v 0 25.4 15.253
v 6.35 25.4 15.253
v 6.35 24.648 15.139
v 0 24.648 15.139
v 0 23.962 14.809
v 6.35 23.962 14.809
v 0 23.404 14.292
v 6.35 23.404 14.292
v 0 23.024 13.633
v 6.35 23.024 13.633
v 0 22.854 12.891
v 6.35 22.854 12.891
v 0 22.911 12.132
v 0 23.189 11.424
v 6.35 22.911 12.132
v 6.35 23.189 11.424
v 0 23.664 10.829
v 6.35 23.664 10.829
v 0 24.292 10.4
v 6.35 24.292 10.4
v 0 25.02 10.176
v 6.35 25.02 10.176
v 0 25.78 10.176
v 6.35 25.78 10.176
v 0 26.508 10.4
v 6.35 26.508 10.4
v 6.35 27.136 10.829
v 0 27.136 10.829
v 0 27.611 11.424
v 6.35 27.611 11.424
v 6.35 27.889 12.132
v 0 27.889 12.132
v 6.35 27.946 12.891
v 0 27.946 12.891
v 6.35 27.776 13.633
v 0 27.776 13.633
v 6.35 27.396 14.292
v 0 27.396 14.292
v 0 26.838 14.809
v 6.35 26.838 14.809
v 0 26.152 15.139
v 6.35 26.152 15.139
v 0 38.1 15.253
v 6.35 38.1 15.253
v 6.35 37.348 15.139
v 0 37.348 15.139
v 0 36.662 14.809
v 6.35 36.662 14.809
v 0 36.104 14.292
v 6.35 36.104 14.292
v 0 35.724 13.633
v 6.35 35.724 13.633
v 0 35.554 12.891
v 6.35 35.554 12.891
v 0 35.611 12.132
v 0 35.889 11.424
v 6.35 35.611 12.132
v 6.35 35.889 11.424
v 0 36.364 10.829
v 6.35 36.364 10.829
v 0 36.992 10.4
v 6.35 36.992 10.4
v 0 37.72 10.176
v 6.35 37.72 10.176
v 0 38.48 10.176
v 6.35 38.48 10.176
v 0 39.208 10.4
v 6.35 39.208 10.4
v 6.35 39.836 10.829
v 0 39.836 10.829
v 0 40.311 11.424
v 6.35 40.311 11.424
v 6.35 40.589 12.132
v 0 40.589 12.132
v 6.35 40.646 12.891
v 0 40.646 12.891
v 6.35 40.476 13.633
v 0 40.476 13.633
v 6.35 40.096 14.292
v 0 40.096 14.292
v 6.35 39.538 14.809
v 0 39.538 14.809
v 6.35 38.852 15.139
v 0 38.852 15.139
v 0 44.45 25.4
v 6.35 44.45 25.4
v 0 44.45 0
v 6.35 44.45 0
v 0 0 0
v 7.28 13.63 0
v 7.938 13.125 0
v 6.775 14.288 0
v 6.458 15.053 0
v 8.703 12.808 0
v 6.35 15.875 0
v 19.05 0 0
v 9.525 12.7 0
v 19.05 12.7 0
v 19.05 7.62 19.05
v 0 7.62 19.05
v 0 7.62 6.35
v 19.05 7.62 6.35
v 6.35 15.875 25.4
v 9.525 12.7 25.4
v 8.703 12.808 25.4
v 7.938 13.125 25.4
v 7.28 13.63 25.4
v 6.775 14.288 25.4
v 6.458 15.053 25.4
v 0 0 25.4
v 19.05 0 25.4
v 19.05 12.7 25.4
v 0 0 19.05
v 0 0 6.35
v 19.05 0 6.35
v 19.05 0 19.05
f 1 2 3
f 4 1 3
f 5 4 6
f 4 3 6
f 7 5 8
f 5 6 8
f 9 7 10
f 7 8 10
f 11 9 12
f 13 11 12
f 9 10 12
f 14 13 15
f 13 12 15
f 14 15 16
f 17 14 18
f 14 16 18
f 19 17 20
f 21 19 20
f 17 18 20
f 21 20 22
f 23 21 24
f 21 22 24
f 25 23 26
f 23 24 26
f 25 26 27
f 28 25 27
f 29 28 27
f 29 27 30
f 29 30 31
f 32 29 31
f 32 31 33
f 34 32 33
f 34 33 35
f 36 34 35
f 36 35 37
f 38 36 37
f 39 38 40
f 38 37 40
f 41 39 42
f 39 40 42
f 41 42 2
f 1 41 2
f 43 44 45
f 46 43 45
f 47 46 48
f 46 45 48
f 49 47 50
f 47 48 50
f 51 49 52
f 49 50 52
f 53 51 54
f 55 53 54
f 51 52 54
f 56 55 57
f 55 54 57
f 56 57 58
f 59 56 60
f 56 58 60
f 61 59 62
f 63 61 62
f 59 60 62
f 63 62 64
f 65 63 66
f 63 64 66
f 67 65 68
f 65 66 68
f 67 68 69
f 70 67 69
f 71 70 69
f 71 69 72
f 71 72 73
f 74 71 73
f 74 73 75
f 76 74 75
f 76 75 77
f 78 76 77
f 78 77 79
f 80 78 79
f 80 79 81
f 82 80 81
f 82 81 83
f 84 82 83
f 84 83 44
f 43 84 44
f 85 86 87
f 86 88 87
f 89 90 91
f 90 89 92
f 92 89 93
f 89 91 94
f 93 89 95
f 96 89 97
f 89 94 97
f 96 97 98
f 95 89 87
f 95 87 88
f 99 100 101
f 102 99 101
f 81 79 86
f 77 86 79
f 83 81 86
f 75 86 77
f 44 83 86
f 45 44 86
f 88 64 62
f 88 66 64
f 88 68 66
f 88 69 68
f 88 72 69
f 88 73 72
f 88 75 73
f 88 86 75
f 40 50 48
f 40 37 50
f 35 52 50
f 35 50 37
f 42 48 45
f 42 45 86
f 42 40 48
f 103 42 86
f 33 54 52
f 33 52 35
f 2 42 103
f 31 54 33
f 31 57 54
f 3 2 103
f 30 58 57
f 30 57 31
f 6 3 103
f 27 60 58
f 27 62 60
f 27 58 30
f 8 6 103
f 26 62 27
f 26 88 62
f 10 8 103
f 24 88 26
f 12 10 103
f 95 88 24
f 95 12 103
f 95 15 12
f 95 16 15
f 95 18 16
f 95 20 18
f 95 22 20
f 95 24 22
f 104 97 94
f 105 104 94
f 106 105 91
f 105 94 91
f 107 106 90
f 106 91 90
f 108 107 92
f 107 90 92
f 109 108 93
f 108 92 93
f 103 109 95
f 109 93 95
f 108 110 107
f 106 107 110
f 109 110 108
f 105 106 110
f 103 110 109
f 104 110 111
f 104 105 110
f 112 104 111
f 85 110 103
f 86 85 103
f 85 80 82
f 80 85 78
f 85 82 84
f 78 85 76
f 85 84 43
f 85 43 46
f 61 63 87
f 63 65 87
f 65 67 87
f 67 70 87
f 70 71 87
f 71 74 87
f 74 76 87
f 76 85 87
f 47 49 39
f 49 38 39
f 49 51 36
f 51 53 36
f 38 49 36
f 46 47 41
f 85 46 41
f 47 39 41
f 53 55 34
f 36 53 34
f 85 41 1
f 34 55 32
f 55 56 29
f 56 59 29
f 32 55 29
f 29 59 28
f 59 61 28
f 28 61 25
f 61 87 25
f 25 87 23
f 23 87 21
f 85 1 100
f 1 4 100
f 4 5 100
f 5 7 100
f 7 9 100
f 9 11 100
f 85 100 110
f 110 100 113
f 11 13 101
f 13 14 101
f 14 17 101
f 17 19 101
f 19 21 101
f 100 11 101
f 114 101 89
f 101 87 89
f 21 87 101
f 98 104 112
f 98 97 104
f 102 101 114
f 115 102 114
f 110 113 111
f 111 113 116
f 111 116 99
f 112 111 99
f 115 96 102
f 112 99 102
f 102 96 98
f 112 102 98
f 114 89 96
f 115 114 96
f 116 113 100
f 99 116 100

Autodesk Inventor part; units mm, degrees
ref_plane "YZ Plane" through (0, 0, 0) normal (1, 0, 0) x (0, 1, 0)
ref_plane "XZ Plane" through (0, 0, 0) normal (0, 1, 0) x (-1, 0, 0)
ref_plane "XY Plane" through (0, 0, 0) normal (0, 0, 1) x (1, 0, 0)
sketch "Sketch1" plane through (0, 0, 0) normal (0, 0, 1) x (1, 0, 0)
  line L0 (0, 0) -> (19.05, 0)
  line L1 (19.05, 0) -> (19.05, 44.45)
  line L2 (19.05, 44.45) -> (0, 44.45)
  line L3 (0, 44.45) -> (0, 0)
  line L4 (19.05, 44.45) -> (6.35, 44.45)
  line L5 (6.35, 44.45) -> (6.35, 15.875)
  line L6 (9.525, 12.7) -> (19.05, 12.7)
  line L7 (19.05, 12.7) -> (19.05, 44.45)
  arc A0 (6.35, 15.875) -> (9.525, 12.7) centre (9.525, 15.875) ccw
  point P0 (6.35, 12.7)
  dimension "d0" = 44.45
  dimension "d1" = 19.05
  dimension "d2" = 31.75
  dimension "d3" = 6.35
  dimension "d4" = 3.175
extrude "Extrusion1" add sketch "Sketch1" along normal blind 25.4 contours L3 L2 L5 A0 L6 L1 L0
sketch "Sketch2" plane through (0, 0, 0) normal (-1, 0, 0) x (0, 0, 1)
  line L0 (0, 44.45) -> (25.4, 44.45) projected
  point P0 (12.7, 38.1)
  point P1 (12.7, 25.4)
  point P2 (12.7, 44.45)
  dimension "d7" = 12.7
  dimension "d8" = 6.35
hole "Hole1" at (0, 38.1, 12.7) at (0, 25.4, 12.7) direction (1, 0, 0) diameter 5.1054 end through all clearance for "Flat Head Machine Screw (82)" size "#10" standard "Ansi Unified Screw Threads"
sketch "Sketch3" plane through (0, 0, 0) normal (-1, 0, 0) x (0, 0, 1)
  line L0 (0, 0) -> (25.4, 0) projected
  line L1 (6.35, 0) -> (19.05, 0)
  line L2 (19.05, 0) -> (19.05, 7.62)
  line L3 (19.05, 7.62) -> (6.35, 7.62)
  line L4 (6.35, 7.62) -> (6.35, 0)
  point P0 (12.7, 0)
  dimension "d16" = 12.7
  dimension "d17" = 7.62
extrude "Extrusion2" cut sketch "Sketch3" against normal through all
properties part number "gripper jaw"
